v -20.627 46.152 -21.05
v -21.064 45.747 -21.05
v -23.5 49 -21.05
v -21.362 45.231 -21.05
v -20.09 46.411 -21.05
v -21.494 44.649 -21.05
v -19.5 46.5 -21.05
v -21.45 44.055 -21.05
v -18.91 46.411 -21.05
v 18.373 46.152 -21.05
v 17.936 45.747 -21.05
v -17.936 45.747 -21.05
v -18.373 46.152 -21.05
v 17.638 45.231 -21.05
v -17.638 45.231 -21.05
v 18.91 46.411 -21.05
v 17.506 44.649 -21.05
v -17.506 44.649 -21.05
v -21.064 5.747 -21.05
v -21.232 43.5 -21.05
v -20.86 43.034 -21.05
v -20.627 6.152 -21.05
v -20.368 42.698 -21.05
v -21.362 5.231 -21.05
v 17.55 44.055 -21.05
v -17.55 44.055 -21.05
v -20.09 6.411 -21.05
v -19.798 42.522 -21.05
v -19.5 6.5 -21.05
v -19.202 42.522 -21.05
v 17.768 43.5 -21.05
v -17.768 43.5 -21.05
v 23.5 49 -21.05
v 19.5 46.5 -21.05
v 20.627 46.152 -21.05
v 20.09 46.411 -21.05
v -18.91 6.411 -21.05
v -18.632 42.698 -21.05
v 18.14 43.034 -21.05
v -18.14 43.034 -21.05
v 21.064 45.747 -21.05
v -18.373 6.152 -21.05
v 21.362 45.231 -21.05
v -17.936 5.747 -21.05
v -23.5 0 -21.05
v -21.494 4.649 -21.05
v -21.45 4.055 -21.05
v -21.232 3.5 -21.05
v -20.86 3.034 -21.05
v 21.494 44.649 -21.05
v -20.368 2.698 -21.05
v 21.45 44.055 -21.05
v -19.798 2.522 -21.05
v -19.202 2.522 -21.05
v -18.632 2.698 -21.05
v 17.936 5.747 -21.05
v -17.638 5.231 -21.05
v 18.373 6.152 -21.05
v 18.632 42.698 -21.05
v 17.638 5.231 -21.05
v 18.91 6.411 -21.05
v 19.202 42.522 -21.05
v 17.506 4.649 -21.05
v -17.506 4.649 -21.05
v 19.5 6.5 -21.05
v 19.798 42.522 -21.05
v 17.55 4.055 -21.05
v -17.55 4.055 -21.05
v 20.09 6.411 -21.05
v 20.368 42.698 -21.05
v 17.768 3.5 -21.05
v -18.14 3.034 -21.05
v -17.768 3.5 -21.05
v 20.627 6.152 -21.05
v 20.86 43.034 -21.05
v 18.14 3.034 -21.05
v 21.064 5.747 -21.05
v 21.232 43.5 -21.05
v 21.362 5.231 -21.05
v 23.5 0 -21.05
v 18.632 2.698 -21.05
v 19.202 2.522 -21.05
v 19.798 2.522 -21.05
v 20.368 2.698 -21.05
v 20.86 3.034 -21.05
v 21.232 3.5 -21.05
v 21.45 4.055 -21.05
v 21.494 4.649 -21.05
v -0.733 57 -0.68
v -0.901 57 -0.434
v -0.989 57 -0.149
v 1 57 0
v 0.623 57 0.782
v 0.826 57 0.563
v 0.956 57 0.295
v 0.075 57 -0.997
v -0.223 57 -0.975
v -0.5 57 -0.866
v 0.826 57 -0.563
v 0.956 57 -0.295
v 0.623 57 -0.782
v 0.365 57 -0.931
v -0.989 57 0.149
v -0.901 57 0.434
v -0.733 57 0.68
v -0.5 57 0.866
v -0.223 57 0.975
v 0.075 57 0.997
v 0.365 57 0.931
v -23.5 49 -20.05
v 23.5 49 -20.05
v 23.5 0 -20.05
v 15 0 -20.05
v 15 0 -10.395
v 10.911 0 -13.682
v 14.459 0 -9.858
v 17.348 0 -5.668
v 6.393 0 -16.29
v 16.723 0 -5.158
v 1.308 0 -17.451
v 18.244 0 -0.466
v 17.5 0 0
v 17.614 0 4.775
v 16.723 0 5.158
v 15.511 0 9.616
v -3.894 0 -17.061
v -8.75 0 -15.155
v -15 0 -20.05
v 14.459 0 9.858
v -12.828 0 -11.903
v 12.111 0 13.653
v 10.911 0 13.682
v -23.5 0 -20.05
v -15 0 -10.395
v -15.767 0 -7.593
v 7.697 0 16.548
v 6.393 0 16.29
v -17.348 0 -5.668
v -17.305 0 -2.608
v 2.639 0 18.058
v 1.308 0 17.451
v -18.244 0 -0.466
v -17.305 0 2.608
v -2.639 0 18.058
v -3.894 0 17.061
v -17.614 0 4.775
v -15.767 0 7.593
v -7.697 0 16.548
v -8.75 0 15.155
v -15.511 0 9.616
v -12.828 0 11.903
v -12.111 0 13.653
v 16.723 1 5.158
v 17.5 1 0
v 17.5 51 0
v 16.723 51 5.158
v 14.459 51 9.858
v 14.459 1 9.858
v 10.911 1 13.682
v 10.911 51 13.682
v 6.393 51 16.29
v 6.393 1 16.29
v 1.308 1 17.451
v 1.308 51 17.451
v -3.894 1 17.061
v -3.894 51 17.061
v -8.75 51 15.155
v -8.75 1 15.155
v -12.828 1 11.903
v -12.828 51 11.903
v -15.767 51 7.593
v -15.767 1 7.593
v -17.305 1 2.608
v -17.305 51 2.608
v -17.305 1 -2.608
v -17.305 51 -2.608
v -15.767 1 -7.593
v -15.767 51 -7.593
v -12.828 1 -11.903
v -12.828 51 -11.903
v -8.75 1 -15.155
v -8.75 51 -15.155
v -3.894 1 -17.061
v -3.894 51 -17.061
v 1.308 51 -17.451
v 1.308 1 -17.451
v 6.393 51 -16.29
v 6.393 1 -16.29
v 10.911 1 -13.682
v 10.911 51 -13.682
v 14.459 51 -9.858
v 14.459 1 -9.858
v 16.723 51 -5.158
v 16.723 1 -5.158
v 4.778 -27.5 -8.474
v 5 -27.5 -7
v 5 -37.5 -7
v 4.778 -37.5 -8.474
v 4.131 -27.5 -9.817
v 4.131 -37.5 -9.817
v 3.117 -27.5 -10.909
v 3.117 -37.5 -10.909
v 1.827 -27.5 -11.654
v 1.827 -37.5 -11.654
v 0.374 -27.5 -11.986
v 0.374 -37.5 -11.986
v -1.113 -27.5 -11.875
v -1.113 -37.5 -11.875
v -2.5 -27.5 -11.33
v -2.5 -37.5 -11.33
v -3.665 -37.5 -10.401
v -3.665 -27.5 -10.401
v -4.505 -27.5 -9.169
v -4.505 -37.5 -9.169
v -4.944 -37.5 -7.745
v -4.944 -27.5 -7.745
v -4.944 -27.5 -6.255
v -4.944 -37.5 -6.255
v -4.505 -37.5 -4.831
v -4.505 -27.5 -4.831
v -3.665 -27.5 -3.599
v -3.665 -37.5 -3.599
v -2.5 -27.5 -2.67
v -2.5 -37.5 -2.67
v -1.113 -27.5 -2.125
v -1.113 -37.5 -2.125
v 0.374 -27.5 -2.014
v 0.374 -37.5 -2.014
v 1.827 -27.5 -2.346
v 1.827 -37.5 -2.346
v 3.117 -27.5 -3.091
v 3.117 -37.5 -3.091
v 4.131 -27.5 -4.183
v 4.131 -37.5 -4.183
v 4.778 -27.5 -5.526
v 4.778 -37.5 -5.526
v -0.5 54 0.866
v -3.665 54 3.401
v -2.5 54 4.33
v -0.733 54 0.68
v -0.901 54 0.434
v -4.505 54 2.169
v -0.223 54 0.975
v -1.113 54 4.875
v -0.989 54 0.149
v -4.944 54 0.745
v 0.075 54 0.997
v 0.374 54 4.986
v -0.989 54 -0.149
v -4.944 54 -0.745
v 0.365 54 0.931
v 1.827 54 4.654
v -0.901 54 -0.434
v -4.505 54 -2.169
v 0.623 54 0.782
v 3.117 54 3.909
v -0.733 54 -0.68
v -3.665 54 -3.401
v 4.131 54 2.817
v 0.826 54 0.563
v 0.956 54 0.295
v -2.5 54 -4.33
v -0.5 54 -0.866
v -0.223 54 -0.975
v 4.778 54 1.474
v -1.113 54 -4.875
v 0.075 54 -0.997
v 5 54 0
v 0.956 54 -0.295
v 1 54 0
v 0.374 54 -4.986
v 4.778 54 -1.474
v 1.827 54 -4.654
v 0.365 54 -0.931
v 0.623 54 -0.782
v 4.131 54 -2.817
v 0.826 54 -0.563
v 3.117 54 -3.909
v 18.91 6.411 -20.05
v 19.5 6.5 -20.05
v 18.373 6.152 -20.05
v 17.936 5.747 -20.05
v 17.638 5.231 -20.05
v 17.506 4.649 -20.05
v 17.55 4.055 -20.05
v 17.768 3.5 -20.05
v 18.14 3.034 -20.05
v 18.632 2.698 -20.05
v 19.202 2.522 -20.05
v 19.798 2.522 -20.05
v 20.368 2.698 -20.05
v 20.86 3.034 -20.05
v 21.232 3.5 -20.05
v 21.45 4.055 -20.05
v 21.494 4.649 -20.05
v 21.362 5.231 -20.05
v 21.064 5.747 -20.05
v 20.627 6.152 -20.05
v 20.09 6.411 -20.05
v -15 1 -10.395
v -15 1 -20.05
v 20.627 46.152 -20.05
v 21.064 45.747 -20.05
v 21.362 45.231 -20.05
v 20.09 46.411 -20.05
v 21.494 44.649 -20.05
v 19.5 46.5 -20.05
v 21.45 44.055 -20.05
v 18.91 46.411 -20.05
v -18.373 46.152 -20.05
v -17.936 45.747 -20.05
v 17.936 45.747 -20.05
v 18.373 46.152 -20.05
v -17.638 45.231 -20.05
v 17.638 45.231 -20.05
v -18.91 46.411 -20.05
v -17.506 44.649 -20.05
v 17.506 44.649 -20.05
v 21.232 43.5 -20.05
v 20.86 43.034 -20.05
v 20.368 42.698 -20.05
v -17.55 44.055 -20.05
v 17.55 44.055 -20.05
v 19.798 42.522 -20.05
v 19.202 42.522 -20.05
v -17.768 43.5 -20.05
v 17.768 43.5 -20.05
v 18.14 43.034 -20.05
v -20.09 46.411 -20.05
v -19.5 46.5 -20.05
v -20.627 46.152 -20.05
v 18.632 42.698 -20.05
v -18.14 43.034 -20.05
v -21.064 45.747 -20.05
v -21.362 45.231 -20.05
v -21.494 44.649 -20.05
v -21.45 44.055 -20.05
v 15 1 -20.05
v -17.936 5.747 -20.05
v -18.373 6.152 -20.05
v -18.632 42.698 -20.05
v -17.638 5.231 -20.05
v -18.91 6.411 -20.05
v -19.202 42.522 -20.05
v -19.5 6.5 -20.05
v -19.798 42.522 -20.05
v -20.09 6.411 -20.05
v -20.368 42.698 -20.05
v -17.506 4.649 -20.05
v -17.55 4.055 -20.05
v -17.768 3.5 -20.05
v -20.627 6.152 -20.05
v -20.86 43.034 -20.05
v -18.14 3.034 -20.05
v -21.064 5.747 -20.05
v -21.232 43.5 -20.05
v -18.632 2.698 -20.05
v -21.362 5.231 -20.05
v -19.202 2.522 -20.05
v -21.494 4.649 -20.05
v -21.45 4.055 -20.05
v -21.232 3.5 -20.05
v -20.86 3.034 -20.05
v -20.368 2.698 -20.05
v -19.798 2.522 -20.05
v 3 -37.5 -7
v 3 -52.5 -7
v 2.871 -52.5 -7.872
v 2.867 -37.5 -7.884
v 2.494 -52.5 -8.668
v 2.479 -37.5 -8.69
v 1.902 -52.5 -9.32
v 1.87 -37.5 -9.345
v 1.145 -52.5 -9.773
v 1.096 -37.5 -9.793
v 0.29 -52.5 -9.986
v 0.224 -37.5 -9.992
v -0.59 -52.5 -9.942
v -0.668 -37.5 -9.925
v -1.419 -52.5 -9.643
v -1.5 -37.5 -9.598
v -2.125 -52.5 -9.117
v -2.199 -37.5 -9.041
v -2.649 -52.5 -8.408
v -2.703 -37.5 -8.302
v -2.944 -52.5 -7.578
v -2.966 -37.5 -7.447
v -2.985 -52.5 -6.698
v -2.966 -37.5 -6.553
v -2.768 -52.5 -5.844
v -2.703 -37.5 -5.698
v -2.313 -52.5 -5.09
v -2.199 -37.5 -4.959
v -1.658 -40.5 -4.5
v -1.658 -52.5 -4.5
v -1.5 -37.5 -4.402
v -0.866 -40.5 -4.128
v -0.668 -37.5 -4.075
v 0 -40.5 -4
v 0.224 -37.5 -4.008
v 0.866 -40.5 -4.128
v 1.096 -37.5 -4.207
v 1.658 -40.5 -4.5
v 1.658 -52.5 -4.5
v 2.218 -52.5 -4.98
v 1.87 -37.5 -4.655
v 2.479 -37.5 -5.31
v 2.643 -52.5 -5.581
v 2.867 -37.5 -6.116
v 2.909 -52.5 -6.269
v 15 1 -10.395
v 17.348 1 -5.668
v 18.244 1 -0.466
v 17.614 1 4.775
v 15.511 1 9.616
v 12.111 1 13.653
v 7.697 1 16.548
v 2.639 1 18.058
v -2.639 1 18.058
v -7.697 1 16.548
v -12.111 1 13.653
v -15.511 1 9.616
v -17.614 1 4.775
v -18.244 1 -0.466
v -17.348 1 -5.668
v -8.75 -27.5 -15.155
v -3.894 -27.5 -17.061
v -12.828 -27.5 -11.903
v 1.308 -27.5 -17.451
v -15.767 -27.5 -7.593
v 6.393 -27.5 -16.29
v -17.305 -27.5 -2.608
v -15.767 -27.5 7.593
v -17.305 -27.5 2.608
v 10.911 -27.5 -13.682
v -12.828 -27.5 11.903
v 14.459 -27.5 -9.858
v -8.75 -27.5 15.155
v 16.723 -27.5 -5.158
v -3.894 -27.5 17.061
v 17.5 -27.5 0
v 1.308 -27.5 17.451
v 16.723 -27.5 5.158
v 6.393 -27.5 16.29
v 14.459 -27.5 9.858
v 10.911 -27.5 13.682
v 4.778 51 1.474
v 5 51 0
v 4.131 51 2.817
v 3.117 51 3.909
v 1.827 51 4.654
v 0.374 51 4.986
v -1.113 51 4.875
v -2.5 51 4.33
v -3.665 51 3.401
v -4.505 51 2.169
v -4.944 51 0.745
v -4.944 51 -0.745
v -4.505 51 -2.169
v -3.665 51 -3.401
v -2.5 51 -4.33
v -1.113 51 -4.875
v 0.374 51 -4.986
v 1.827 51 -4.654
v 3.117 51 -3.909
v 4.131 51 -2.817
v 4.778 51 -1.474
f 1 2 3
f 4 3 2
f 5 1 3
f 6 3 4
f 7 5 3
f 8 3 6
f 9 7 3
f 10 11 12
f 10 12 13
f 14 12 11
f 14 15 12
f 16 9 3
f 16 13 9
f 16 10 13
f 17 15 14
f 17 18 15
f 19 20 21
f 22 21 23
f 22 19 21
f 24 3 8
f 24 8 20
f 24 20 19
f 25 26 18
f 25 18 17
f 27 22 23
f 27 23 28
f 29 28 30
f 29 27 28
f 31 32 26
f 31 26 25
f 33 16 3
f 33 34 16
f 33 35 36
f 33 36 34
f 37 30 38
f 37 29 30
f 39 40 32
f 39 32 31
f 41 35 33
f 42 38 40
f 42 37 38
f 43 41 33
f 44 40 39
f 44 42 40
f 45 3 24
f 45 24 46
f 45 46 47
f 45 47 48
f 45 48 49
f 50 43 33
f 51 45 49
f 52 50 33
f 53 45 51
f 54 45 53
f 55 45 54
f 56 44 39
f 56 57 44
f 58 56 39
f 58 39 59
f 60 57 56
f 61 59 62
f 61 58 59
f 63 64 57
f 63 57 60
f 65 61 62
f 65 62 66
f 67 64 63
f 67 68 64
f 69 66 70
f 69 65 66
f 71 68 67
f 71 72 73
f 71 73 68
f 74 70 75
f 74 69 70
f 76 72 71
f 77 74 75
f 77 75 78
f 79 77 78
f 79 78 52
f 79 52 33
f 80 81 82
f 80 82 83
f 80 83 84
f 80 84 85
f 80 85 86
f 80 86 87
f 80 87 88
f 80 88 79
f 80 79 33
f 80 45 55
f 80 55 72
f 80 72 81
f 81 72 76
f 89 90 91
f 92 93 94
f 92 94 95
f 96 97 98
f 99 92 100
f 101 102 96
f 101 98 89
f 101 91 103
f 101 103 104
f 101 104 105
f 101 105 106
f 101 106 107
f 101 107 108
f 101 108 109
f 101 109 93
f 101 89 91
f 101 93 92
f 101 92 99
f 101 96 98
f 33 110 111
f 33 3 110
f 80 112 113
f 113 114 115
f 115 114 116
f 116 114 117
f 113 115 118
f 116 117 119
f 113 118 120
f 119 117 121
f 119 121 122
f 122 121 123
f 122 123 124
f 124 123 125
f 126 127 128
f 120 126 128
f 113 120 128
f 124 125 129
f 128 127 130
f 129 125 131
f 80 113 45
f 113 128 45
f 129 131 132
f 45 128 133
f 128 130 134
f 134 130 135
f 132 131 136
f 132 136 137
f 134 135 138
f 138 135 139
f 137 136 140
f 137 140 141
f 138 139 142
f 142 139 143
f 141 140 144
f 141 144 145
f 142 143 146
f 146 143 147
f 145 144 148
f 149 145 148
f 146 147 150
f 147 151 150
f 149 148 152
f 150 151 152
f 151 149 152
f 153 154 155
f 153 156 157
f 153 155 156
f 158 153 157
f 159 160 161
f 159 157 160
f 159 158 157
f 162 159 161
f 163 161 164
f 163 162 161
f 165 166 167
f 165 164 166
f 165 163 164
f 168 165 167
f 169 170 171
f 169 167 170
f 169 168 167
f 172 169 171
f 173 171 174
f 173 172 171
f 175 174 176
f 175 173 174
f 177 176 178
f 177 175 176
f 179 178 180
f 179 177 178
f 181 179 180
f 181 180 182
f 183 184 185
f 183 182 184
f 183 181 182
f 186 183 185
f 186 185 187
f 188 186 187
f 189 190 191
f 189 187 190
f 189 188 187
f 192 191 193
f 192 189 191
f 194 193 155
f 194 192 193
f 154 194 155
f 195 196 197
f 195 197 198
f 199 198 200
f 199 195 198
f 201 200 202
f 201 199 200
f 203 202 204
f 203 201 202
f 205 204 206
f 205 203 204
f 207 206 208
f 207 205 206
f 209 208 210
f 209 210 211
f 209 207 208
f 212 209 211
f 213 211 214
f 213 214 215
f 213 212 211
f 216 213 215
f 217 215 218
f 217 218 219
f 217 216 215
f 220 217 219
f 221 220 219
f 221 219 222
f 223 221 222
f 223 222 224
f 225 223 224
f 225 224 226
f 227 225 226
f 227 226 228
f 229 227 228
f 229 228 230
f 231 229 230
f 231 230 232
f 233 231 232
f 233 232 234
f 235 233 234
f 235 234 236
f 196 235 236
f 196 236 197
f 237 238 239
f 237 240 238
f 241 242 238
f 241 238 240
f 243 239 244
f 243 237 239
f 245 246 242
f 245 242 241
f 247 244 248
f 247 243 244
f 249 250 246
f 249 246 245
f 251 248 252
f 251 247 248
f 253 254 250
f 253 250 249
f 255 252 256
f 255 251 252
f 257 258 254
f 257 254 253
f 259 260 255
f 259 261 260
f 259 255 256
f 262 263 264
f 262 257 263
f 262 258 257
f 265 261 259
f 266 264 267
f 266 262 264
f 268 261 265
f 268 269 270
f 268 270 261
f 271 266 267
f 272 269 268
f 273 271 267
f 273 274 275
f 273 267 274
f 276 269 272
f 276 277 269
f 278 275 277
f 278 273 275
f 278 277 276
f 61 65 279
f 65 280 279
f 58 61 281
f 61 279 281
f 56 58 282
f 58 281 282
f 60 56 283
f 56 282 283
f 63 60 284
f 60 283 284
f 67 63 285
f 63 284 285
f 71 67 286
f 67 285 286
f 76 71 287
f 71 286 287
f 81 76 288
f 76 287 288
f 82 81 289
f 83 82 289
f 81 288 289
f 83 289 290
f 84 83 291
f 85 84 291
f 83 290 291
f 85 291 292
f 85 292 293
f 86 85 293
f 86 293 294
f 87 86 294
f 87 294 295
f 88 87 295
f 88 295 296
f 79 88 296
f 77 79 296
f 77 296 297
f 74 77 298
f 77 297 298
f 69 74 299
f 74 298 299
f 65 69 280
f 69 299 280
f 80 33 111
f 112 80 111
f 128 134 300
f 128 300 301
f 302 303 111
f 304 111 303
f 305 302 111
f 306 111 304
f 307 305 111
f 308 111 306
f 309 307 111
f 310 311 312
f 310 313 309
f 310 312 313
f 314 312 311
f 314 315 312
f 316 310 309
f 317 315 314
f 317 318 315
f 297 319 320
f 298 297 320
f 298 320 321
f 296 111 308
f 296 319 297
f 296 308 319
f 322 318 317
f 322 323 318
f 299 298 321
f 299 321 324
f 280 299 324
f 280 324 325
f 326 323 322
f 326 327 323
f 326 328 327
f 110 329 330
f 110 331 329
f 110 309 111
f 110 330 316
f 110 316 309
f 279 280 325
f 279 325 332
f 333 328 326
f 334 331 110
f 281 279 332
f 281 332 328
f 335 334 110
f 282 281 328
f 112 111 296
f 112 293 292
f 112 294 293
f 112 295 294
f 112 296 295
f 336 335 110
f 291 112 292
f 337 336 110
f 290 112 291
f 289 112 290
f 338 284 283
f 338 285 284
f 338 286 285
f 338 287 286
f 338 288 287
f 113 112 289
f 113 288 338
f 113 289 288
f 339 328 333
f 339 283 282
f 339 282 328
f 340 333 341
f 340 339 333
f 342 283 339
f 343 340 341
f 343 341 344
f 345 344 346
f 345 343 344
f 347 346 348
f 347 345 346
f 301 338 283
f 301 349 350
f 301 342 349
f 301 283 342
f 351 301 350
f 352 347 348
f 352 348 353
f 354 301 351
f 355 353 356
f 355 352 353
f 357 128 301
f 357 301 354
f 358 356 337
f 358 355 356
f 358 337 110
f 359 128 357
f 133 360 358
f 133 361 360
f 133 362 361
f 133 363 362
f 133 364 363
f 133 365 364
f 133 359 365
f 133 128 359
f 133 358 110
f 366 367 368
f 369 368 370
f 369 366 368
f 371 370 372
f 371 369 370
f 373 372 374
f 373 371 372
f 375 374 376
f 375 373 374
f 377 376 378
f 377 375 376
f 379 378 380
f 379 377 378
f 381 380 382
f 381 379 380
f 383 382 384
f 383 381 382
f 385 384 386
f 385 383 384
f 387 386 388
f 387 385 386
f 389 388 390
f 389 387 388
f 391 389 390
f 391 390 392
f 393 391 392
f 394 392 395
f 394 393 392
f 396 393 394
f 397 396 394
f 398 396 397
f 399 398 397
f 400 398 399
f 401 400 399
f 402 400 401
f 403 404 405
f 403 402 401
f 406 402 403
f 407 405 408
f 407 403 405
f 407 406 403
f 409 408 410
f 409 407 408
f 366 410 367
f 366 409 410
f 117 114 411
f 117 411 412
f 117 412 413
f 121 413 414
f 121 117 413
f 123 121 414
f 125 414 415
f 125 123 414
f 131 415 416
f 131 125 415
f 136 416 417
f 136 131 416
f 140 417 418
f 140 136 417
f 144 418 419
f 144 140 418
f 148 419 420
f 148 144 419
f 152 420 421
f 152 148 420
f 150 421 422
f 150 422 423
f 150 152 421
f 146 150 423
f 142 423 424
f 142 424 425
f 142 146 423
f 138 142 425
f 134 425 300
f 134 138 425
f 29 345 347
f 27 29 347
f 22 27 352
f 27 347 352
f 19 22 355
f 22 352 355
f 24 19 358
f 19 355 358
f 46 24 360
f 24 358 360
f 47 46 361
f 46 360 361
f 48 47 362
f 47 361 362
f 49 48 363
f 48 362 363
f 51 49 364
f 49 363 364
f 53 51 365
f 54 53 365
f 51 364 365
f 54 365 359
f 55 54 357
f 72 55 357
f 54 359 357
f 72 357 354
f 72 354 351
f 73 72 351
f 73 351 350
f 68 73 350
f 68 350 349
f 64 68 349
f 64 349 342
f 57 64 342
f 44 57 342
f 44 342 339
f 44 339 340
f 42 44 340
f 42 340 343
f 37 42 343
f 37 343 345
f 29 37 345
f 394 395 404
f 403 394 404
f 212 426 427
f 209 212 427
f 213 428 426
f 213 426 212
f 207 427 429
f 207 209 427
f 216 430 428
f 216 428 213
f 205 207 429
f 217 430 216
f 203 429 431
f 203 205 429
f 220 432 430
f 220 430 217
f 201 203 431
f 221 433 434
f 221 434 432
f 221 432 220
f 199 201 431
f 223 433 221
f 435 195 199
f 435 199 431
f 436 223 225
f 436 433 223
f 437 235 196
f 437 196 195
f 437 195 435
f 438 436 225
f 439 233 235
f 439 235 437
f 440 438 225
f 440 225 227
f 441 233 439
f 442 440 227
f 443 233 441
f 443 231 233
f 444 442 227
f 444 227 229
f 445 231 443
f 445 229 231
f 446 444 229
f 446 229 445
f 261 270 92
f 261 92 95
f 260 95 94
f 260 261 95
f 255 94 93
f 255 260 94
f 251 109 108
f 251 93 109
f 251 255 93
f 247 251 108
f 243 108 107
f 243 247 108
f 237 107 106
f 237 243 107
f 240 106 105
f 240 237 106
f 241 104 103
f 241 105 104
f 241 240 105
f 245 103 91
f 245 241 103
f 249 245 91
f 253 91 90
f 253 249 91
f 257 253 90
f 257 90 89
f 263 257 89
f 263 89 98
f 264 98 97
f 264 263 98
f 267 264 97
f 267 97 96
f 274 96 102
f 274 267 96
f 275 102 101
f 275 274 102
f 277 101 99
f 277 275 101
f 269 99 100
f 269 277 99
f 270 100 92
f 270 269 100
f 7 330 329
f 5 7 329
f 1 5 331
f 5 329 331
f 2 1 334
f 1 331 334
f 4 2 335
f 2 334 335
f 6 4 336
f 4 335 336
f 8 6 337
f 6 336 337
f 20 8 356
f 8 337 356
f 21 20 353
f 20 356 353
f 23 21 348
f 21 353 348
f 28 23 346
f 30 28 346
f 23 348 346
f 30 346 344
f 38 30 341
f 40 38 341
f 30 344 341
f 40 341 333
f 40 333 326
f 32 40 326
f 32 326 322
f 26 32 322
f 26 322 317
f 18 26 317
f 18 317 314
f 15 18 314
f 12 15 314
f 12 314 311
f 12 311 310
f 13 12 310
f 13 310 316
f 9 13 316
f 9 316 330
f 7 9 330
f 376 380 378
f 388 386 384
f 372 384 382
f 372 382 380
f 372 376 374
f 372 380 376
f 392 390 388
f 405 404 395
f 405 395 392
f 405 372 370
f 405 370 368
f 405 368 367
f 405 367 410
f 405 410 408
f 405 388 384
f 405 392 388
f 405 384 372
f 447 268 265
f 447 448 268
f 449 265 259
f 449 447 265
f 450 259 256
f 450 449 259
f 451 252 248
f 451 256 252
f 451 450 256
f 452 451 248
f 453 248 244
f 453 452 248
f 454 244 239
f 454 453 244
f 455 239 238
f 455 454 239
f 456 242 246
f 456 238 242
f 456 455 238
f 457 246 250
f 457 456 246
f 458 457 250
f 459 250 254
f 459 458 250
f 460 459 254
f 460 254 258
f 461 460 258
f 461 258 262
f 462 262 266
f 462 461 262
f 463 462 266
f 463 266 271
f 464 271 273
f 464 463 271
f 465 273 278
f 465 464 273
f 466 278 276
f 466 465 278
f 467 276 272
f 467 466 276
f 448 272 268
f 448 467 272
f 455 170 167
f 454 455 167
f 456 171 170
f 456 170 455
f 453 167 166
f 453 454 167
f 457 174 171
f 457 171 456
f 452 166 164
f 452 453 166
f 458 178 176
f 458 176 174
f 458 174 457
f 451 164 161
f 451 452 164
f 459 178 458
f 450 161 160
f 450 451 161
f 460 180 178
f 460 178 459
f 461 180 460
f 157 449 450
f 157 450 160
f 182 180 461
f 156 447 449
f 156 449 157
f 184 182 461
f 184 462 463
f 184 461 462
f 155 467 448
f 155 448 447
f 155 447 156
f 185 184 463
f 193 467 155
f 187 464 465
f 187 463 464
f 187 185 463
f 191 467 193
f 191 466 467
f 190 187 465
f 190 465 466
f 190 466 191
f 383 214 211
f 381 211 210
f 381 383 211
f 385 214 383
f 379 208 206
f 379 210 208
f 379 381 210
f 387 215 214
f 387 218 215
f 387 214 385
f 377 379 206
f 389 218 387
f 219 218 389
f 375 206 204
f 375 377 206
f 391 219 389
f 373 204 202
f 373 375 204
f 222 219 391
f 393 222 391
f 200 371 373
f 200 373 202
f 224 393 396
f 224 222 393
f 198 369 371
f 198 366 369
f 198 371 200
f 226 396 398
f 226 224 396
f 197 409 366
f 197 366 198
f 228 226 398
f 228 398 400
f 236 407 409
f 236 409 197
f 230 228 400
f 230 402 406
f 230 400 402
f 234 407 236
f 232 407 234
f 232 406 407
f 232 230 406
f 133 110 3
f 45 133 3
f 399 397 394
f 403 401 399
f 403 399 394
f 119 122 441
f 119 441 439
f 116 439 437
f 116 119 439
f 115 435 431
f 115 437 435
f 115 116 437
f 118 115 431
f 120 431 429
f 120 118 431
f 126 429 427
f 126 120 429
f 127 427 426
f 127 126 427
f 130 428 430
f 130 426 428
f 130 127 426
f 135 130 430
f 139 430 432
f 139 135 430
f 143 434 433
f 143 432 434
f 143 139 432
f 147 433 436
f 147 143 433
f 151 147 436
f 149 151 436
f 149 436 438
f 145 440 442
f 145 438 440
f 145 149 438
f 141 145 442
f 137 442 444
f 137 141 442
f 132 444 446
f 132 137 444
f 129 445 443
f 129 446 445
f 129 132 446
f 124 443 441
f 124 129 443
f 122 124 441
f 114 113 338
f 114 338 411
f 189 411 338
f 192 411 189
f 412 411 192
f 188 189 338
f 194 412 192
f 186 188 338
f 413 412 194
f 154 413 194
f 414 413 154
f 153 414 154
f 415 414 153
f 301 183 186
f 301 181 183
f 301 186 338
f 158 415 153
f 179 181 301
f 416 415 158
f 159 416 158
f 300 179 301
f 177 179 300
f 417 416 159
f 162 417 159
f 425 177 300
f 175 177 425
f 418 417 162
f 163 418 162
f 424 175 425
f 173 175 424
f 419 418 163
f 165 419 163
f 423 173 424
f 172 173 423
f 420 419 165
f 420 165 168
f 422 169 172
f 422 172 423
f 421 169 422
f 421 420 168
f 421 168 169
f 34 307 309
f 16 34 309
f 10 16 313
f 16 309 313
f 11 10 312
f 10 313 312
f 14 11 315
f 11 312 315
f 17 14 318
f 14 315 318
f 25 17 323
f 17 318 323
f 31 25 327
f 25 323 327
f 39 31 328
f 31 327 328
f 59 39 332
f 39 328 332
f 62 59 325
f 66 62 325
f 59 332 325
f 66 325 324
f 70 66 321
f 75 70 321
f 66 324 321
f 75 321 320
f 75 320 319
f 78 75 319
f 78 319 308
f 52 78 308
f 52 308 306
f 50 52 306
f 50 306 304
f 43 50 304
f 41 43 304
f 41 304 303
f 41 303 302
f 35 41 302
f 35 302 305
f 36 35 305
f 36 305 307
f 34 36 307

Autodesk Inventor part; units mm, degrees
ref_plane "YZ Plane" through (0, 0, 0) normal (1, 0, 0) x (0, 1, 0)
ref_plane "XZ Plane" through (0, 0, 0) normal (0, 1, 0) x (-1, 0, 0)
ref_plane "XY Plane" through (0, 0, 0) normal (0, 0, 1) x (1, 0, 0)
sketch "Esquisse1" plane through (0, 0, 0) normal (0, 1, 0) x (-1, 0, 0)
  circle A0 centre (0, 0) radius 18.25
  line L0 (-15, 0) -> (15, 0)
  line L1 (15, 0) -> (15, -20.05)
  line L2 (15, -20.05) -> (-15, -20.05)
  line L3 (-15, -20.05) -> (-15, 0)
  line L4 (-23.5, -21.05) -> (23.5, -21.05)
  line L5 (23.5, -21.05) -> (23.5, -20.05)
  line L6 (23.5, -20.05) -> (-23.5, -20.05)
  line L7 (-23.5, -20.05) -> (-23.5, -21.05)
  dimension "d0" = 36.5
  dimension "d1" = 30
  dimension "d2" = 15
  dimension "d3" = 1
  dimension "d4" = 47
  dimension "d5" = 23.5
  dimension "d6" = 39.3
extrude "Extrusion1" add sketch "Esquisse1" along normal blind 1
sketch "Esquisse2" plane through (0, 1, 0) normal (0, 1, 0) x (1, 0, 0)
  arc A0 (-15, 10.3953) -> (15, 10.3953) centre (0, 0) ccw projected
  circle A1 centre (0, 0) radius 17.5
  dimension "d9" = 35
extrude "Extrusion2" add sketch "Esquisse2" along normal blind 50
sketch "Esquisse3" plane through (0, 0, 0) normal (0, -1, 0) x (1, 0, 0)
  arc A0 (15, -10.3953) -> (-15, -10.3953) centre (0, 0) ccw projected
  circle A1 centre (0, 0) radius 17.5
  dimension "d12" = 35
extrude "Extrusion3" add sketch "Esquisse3" along normal blind 27.5
sketch "Esquisse4" plane through (0, 1, 0) normal (0, 1, 0) x (1, 0, 0)
  line L0 (-23.5, 21.05) -> (23.5, 21.05)
  line L1 (23.5, 21.05) -> (23.5, 20.05)
  line L2 (23.5, 20.05) -> (-23.5, 20.05)
  line L3 (-23.5, 20.05) -> (-23.5, 21.05)
extrude "Extrusion4" add sketch "Esquisse4" along normal blind 48
sketch "Esquisse5" plane through (0, -27.5, 0) normal (0, -1, 0) x (1, 0, 0)
  circle A0 centre (0, 0) radius 17.5 projected
  line L0 (0, 0) -> (0, -17.5)
  circle A1 centre (0, -7) radius 5
  dimension "d17" = 7
  dimension "d18" = 10
extrude "Extrusion5" add sketch "Esquisse5" along normal blind 10 contours A1 L0 | L0 A1
sketch "Esquisse6" plane through (0, -37.5, -7) normal (0, -1, 0) x (1, 0, 0)
  circle A0 centre (0, 0) radius 5 projected
  circle A1 centre (0, 0) radius 3
  point P0 (0, 7)
  dimension "d21" = 6
extrude "Extrusion6" add sketch "Esquisse6" along normal blind 15 contours A1
sketch "Esquisse7" plane through (0, -52.5, -7) normal (0, -1, 0) x (1, 0, 0)
  circle A0 centre (0, 0) radius 3 projected
  line L0 (-1.6583, 2.5) -> (1.6583, 2.5)
  line L1 (1.6583, 2.5) -> (1.6583, 0)
  line L2 (1.6583, 0) -> (-1.6583, 0)
  line L3 (-1.6583, 0) -> (-1.6583, 2.5)
  arc A1 (1.6583, 2.5) -> (-1.6583, 2.5) centre (0, 0) ccw
  arc A2 (-1.6583, 2.5) -> (1.6583, 2.5) centre (0, 0) ccw
  point P0 (0, 7)
  dimension "d27" = 5.5
extrude "Extrusion7" cut sketch "Esquisse7" against normal blind 12 contours L0 A0
sketch "Esquisse8" plane through (0, 51, 0) normal (0, 1, 0) x (1, 0, 0)
  circle A0 centre (0, 0) radius 17.5 projected
  circle A1 centre (0, 0) radius 5
  dimension "d28" = 10
extrude "Extrusion8" add sketch "Esquisse8" along normal blind 3 contours A1
sketch "Esquisse9" plane through (0, 54, 0) normal (0, 1, 0) x (1, 0, 0)
  circle A0 centre (0, 0) radius 5 projected
  circle A1 centre (0, 0) radius 1
  dimension "d31" = 2
extrude "Extrusion9" add sketch "Esquisse9" along normal blind 3 contours A1
sketch "Esquisse10" plane through (23.5, 0, -21.05) normal (0, 0, -1) x (-1, 0, 0)
  line L0 (0, 0) -> (47, 0) projected
  line L1 (47, 0) -> (47, 49) projected
  line L2 (0, 49) -> (47, 49) projected
  line L3 (0, 0) -> (0, 49) projected
  line L4 (4, 44.5) -> (43, 44.5)
  line L5 (43, 44.5) -> (43, 4.5)
  line L6 (43, 4.5) -> (4, 4.5)
  line L7 (4, 4.5) -> (4, 44.5)
  point P0 (23.5, 0)
  dimension "d34" = 39
  dimension "d35" = 47
  dimension "d36" = 4
  dimension "d37" = 40
  dimension "d38" = 49
  dimension "d39" = 4.5
hole "Perçage1" at (19.5, 44.5, -21.05) at (-19.5, 44.5, -21.05) at (-19.5, 4.5, -21.05) at (19.5, 4.5, -21.05) direction (0, 0, 1) diameter 4 end through all
equation "\"d2\" = 0.5 * d1"
equation "\"d5\" = 0.5 * d4"
equation "\"d36\" = -0.5 * d34 + 0.5 * d35"
equation "\"d39\" = -0.5 * d37 + 0.5 * d38"
properties part number "mfa_970d471"
